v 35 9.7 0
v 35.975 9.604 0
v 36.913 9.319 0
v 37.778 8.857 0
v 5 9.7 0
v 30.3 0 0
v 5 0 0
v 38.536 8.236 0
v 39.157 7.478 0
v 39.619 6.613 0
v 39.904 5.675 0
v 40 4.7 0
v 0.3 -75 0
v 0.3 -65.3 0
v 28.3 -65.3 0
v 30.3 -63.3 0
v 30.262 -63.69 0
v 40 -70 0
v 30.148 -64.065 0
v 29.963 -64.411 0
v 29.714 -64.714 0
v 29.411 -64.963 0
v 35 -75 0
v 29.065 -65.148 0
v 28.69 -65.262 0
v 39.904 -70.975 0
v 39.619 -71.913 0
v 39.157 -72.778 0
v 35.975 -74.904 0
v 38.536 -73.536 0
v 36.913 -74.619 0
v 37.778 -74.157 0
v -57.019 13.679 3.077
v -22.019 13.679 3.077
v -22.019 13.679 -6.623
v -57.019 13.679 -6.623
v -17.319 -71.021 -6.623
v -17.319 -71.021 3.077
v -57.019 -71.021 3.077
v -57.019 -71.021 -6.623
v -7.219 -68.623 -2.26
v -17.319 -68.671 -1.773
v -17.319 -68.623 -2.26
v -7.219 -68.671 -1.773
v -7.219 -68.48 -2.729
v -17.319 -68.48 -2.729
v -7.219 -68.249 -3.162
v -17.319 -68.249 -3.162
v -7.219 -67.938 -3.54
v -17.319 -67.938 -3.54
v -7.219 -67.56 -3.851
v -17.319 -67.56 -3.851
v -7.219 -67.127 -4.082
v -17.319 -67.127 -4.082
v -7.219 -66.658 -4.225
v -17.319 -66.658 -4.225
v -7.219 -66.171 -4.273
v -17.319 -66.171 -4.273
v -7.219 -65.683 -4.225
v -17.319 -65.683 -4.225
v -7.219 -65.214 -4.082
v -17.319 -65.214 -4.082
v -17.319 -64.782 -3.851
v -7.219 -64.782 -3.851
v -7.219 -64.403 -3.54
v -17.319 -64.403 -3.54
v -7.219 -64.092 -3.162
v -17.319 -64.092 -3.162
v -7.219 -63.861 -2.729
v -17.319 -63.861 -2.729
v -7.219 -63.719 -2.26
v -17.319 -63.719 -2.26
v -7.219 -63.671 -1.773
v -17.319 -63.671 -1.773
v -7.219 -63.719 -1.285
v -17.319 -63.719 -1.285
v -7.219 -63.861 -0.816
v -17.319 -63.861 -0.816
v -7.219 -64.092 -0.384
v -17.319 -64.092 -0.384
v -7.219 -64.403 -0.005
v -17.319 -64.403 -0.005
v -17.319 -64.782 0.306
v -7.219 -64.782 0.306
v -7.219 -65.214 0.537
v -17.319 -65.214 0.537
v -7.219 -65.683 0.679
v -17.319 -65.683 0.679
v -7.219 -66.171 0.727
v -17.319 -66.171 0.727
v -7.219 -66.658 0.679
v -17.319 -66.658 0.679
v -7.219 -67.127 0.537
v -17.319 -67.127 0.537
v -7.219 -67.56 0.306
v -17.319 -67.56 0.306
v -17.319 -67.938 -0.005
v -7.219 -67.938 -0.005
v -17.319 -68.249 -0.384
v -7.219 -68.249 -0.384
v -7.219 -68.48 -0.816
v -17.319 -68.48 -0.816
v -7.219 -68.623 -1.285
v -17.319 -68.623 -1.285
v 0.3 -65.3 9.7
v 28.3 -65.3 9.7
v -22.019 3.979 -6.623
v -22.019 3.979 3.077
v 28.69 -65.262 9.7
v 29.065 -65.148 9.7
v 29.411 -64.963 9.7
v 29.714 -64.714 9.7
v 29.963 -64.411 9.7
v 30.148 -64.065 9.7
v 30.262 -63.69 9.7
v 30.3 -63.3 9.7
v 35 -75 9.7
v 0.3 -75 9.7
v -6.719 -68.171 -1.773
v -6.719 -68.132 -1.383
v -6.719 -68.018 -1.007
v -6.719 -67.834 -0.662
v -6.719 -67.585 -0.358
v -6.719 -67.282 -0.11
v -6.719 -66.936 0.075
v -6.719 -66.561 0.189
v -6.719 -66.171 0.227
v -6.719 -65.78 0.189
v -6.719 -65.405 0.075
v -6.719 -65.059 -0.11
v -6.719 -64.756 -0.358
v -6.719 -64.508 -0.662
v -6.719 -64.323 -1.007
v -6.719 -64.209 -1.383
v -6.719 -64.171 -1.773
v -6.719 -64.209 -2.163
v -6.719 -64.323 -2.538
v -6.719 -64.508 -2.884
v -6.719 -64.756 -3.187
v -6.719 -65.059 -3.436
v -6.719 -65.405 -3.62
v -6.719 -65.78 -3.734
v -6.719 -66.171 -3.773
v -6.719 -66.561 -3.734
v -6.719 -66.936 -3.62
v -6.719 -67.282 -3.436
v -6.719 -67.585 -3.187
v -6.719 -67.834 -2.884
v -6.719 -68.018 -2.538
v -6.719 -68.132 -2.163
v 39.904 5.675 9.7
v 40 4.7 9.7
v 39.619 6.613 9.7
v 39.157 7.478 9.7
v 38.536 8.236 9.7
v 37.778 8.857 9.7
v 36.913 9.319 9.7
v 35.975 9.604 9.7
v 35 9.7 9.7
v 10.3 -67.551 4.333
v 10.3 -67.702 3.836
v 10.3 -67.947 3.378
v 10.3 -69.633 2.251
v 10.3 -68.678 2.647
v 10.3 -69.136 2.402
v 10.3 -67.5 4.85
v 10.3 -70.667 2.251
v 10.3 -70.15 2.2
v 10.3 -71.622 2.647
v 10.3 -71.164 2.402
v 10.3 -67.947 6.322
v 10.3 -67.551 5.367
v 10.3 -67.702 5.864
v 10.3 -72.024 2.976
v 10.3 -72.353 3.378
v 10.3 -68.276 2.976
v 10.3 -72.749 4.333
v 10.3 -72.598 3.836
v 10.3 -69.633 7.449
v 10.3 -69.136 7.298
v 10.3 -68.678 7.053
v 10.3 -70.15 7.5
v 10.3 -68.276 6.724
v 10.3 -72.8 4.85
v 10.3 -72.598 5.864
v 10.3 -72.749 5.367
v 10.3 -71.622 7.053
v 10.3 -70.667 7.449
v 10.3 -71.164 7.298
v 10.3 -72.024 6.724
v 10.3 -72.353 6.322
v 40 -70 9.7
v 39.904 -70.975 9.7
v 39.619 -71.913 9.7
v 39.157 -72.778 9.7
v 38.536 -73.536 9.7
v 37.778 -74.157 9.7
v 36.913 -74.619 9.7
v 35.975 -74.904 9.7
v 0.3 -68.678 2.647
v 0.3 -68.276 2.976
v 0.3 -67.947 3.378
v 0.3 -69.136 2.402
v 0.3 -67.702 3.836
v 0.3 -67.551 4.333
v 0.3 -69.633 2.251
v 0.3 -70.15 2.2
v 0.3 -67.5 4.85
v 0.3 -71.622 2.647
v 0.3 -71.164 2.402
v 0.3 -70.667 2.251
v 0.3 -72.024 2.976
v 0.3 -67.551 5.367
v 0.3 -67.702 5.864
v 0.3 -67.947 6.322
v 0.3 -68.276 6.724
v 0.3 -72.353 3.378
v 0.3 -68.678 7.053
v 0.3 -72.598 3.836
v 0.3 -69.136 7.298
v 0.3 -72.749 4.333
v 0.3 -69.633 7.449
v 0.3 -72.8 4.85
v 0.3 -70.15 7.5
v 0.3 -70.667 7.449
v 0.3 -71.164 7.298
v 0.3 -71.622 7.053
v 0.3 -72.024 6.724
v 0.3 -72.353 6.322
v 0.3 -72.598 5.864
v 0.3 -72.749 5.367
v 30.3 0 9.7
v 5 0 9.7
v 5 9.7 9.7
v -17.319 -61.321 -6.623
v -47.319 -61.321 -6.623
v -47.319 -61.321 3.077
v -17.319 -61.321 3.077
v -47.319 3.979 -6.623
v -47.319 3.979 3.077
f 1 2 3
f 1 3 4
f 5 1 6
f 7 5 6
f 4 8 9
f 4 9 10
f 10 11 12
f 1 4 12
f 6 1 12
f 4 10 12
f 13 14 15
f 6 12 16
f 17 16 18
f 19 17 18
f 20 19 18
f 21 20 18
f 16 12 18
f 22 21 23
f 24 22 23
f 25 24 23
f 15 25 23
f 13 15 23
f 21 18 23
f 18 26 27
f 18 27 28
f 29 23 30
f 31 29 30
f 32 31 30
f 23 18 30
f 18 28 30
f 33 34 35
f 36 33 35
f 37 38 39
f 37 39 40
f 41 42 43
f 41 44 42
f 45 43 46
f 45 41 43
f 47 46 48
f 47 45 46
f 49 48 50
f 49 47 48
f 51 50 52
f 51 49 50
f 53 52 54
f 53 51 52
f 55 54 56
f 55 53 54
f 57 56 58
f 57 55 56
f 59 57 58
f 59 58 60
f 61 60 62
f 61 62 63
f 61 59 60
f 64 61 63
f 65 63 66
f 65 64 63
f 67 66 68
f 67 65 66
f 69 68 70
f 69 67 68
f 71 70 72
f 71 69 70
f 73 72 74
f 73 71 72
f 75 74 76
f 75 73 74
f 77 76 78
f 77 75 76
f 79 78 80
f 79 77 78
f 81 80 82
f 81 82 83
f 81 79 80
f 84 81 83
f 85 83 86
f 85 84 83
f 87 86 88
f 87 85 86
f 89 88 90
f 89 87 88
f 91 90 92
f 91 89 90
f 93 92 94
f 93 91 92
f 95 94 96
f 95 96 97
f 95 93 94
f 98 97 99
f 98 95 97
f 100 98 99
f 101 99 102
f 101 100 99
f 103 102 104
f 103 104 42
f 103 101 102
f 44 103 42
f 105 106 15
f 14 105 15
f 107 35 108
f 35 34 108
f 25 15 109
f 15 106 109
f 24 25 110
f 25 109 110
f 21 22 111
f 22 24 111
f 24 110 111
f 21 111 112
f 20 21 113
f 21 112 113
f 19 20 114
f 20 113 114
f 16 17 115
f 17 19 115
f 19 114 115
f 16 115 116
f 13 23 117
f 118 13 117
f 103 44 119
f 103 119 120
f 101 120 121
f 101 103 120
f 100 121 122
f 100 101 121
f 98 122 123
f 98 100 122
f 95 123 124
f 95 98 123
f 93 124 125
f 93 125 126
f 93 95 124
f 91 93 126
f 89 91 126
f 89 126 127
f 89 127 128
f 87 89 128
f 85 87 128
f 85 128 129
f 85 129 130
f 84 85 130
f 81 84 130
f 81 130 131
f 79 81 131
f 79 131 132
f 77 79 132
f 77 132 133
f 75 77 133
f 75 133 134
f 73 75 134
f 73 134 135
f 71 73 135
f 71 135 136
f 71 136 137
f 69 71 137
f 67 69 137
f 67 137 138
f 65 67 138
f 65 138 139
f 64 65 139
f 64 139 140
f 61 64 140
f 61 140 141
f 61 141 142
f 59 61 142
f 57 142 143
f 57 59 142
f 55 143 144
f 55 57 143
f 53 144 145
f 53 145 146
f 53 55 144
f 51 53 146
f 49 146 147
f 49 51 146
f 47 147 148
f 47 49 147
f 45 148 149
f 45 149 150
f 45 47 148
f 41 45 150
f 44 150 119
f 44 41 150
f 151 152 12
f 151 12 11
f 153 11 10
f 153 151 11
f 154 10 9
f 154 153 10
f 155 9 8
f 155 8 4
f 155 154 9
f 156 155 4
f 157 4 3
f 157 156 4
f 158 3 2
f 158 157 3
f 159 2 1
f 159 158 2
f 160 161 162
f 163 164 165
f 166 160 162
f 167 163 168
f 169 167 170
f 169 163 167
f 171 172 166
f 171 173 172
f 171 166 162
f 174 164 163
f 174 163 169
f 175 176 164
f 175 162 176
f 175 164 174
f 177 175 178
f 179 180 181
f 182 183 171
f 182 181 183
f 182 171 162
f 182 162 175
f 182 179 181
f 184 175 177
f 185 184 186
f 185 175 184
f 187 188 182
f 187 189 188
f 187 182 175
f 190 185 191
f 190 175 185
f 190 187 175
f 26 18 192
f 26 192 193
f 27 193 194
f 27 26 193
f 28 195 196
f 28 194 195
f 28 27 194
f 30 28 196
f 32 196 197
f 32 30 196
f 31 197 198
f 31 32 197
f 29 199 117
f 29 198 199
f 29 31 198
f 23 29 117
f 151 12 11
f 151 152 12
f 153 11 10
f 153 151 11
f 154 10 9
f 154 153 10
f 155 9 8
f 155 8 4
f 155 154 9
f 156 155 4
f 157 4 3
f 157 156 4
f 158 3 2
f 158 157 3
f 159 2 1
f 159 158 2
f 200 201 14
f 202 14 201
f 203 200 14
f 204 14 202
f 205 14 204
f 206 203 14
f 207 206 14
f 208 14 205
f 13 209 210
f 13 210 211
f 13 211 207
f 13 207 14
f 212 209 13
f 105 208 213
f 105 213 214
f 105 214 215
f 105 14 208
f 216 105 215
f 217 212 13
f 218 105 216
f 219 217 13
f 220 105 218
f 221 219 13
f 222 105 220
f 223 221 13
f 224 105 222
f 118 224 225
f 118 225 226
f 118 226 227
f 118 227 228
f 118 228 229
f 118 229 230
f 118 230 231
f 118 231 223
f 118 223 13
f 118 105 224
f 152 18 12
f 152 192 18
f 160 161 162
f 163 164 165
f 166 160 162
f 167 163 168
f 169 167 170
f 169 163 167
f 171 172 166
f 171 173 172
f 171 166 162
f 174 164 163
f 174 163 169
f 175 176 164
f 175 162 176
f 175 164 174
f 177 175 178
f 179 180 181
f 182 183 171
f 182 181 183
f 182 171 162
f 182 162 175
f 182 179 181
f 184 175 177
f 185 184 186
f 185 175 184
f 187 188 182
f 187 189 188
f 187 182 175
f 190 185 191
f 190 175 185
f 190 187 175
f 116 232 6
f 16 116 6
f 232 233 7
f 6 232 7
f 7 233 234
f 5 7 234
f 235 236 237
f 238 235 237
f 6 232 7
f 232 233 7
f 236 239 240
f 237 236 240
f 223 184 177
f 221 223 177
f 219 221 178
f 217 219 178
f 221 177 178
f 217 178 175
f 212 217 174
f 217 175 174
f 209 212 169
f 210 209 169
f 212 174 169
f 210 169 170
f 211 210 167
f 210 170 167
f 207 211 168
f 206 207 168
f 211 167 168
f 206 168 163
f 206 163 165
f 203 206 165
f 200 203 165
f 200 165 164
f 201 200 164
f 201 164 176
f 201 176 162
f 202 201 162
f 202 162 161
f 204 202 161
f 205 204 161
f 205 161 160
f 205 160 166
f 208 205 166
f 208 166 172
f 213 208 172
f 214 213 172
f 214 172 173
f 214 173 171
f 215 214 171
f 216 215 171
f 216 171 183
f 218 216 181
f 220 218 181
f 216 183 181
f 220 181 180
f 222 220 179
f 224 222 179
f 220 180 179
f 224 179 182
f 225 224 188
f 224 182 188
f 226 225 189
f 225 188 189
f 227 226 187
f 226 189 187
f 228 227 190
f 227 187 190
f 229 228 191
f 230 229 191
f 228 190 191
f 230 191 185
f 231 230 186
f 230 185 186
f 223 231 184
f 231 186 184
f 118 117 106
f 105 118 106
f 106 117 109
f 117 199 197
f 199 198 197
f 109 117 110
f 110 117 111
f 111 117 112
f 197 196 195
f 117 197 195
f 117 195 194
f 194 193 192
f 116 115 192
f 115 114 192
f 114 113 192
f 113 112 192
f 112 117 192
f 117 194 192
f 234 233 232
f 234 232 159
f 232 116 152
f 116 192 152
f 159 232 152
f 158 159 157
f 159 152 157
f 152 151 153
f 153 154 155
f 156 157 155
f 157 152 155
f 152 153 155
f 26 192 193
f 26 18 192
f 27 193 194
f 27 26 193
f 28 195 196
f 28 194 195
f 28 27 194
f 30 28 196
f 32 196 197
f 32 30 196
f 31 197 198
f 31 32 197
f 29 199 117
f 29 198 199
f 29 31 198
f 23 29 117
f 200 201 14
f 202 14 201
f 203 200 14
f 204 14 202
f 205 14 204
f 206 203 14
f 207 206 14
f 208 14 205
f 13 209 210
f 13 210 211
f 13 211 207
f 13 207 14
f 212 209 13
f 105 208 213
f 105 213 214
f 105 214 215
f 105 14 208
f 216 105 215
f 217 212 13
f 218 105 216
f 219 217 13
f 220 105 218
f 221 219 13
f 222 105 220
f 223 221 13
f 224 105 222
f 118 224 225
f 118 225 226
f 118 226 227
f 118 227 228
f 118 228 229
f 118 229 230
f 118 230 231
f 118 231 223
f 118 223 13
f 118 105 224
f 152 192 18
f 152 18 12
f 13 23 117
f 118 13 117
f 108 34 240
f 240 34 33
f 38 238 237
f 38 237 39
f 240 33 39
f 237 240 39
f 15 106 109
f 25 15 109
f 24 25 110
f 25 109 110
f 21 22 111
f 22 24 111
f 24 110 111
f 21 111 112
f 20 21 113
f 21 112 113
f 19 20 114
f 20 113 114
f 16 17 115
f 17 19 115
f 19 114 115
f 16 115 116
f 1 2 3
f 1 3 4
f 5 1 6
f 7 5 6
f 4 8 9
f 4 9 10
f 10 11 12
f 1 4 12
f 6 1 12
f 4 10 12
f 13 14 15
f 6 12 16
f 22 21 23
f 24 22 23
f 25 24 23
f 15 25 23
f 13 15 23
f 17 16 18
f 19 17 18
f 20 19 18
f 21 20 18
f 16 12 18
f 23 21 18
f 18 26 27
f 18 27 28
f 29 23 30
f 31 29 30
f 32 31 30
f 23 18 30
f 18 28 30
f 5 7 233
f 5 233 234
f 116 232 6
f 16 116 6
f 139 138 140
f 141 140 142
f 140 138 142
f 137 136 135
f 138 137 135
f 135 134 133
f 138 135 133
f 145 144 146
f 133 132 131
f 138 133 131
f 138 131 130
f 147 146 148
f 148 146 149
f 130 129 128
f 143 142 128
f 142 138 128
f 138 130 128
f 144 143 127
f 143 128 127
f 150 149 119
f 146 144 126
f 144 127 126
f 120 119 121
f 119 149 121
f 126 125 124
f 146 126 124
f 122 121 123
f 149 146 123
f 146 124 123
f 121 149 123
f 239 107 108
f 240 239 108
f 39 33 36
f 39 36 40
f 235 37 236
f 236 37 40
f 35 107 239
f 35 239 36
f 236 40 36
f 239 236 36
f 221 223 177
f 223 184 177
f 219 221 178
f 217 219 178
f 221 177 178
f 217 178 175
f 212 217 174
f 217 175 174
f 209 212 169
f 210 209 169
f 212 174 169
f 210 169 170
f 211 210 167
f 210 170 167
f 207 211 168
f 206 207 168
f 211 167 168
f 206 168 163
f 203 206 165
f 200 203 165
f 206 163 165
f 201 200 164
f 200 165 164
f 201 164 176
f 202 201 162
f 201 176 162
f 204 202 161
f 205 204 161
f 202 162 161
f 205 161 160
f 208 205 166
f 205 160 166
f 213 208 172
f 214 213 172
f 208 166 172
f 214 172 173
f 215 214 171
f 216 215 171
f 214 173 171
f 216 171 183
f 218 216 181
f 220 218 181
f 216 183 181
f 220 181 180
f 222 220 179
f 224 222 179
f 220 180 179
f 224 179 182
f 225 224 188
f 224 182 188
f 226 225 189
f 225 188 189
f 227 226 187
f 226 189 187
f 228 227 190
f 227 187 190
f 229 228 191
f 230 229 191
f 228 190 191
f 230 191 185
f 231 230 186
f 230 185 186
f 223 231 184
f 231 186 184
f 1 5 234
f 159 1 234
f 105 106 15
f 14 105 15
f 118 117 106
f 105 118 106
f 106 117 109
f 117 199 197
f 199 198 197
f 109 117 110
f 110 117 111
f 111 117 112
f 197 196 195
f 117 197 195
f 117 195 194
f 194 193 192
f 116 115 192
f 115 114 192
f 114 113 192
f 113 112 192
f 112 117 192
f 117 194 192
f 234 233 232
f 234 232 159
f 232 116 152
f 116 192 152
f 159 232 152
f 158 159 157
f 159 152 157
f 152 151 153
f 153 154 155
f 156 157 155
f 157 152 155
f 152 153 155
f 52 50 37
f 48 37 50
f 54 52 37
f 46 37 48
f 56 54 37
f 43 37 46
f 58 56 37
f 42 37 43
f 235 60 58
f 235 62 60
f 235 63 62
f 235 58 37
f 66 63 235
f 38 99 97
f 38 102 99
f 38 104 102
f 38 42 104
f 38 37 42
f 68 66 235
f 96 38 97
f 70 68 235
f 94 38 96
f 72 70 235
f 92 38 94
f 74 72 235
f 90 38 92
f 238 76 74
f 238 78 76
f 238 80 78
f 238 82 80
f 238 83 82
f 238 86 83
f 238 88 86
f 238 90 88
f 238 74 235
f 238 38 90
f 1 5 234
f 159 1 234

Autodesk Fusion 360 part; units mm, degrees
sketch "Sketch2" plane through (0, 0, 0) normal (0, 0, 1) x (1, 0, 0)
  circle A0 centre (0, 0) radius 20
  circle A1 centre (0, 0) radius 1
  dimension "d22" = 40
extrude "Extrude1" add sketch "Sketch2" along normal blind 10 makes body 1
copy_body "Body->Comp1" bodies 1 removing the originals makes body 2 in component "Component"
component "Component" placed x (1, 0, 0) y (0, 1, 0) z (0, 0, 1) at (0, 0, 0)

Autodesk Fusion 360 part; units mm, degrees
sketch "Sketch1" plane through (0, 0, 0) normal (1, 0, 0) x (0, 1, 0)
  line L0 (0, 0) -> (9.7, 0)
  line L1 (9.7, 0) -> (9.7, 9.7)
  line L2 (9.7, 9.7) -> (0, 9.7)
  line L3 (0, 9.7) -> (0, 0)
  dimension "d1" = 9.7
  dimension "d2" = 9.7
extrude "Extrude1" add sketch "Sketch1" along normal blind 40 makes body 1
sketch "Sketch2" plane through (0, 0, 0) normal (0, -1, 0) x (1, 0, 0)
  line L0 (0, 9.7) -> (0, 0)
  line L1 (0, 0) -> (40, 0)
  line L2 (40, 0) -> (40, 9.7)
  line L3 (40, 9.7) -> (0, 9.7)
  line L4 (40, 9.7) -> (30.3, 9.7)
  line L5 (30.3, 9.7) -> (30.3, 0)
  line L6 (30.3, 0) -> (40, 0)
  line L7 (40, 0) -> (40, 9.7)
  dimension "d5" = 9.7
extrude "Extrude2" add sketch "Sketch2" along normal blind 75 contours L1 L2 L3 L4 L5 L6 L7 bodies 1
sketch "Sketch3" plane through (30.3, 0, 0) normal (-1, 0, 0) x (0, -1, 0)
  line L0 (0, 9.7) -> (0, 0)
  line L1 (0, 0) -> (75, 0)
  line L2 (75, 0) -> (75, 9.7)
  line L3 (75, 9.7) -> (0, 9.7)
  line L4 (75, 9.7) -> (65.3, 9.7)
  line L5 (65.3, 9.7) -> (65.3, -2.721)
  line L6 (65.3, -2.721) -> (75, -2.721)
  line L7 (75, -2.721) -> (75, 9.7)
  dimension "d8" = 9.7
extrude "Extrude3" add sketch "Sketch3" along normal blind 30 contours L1 L2 L3 L4 L5 L7 bodies 1
sketch "Sketch4" plane through (0.3, 0, 0) normal (-1, 0, 0) x (0, -1, 0)
  line L0 (75, 0) -> (75, 9.7)
  line L1 (75, 9.7) -> (65.3, 9.7)
  line L2 (65.3, 9.7) -> (65.3, 0)
  line L3 (65.3, 0) -> (75, 0)
  circle A0 centre (70.15, 4.85) radius 2.5
  line L4 (70.15, 9.7) -> (70.15, 0)
  line L5 (65.3, 4.85) -> (75, 4.85)
  dimension "d11" = 5
extrude "Extrude5" cut sketch "Sketch4" along normal mid plane 20 contours A0 L4 L5 | A0 L4 L5 | A0 L4 L5 | A0 L4 L5 bodies 1
mirror "Mirror1" about plane through (0, 0, 0) normal (1, 0, 0) of bodies 1 makes body 2
extrude "Extrude6" add sketch "Sketch4" along normal up to surface (10.6 mm away) and the other way blind 10 contours A0 L4 L5 | A0 L4 L5 | A0 L4 L5 | A0 L4 L5 bodies 2
chamfer "Chamfer1" distance 0.5 angle 45 1 edges at (10.3, -67.8192, 5.754) on bodies 2
copy_body "Body->Comp1" bodies 1 removing the originals makes body 3 in component "Component"
copy_body "Body->Comp2" bodies 2 removing the originals makes body 4 in component "Component'"
move_face "OffsetFaces1" offset -0.15 1 faces at (6.9667, -72.6469, 4.7254) on bodies 3 in component "Component"
extrude "Extrude1'" cut 1 faces at (0, 3.2333, 6.4667) along direction (1, 0, 0) blind 5 on bodies 3 bodies 3 in component "Component"
extrude "Extrude1''" cut 1 faces at (0, 3.2333, 6.4667) along direction (-1, 0, 0) blind 5 on bodies 4 bodies 4 in component "Component'"
fillet "Fillet1" radius 2 1 edges at (30.3, -65.3, 4.85) on bodies 3 in component "Component"
fillet "Fillet2" radius 5 1 edges at (40, -75, 4.85) on bodies 3 in component "Component"
fillet "Fillet3" radius 5 1 edges at (40, 9.7, 4.85) on bodies 3 in component "Component"
component "Component" placed x (1, 0, 0) y (0, 1, 0) z (0, 0, 1) at (0, 0, 0)
component "Component'" placed x (1, 0, 0) y (0, 1, 0) z (0, 0, 1) at (-17.0193, 3.9794, -6.6227)
